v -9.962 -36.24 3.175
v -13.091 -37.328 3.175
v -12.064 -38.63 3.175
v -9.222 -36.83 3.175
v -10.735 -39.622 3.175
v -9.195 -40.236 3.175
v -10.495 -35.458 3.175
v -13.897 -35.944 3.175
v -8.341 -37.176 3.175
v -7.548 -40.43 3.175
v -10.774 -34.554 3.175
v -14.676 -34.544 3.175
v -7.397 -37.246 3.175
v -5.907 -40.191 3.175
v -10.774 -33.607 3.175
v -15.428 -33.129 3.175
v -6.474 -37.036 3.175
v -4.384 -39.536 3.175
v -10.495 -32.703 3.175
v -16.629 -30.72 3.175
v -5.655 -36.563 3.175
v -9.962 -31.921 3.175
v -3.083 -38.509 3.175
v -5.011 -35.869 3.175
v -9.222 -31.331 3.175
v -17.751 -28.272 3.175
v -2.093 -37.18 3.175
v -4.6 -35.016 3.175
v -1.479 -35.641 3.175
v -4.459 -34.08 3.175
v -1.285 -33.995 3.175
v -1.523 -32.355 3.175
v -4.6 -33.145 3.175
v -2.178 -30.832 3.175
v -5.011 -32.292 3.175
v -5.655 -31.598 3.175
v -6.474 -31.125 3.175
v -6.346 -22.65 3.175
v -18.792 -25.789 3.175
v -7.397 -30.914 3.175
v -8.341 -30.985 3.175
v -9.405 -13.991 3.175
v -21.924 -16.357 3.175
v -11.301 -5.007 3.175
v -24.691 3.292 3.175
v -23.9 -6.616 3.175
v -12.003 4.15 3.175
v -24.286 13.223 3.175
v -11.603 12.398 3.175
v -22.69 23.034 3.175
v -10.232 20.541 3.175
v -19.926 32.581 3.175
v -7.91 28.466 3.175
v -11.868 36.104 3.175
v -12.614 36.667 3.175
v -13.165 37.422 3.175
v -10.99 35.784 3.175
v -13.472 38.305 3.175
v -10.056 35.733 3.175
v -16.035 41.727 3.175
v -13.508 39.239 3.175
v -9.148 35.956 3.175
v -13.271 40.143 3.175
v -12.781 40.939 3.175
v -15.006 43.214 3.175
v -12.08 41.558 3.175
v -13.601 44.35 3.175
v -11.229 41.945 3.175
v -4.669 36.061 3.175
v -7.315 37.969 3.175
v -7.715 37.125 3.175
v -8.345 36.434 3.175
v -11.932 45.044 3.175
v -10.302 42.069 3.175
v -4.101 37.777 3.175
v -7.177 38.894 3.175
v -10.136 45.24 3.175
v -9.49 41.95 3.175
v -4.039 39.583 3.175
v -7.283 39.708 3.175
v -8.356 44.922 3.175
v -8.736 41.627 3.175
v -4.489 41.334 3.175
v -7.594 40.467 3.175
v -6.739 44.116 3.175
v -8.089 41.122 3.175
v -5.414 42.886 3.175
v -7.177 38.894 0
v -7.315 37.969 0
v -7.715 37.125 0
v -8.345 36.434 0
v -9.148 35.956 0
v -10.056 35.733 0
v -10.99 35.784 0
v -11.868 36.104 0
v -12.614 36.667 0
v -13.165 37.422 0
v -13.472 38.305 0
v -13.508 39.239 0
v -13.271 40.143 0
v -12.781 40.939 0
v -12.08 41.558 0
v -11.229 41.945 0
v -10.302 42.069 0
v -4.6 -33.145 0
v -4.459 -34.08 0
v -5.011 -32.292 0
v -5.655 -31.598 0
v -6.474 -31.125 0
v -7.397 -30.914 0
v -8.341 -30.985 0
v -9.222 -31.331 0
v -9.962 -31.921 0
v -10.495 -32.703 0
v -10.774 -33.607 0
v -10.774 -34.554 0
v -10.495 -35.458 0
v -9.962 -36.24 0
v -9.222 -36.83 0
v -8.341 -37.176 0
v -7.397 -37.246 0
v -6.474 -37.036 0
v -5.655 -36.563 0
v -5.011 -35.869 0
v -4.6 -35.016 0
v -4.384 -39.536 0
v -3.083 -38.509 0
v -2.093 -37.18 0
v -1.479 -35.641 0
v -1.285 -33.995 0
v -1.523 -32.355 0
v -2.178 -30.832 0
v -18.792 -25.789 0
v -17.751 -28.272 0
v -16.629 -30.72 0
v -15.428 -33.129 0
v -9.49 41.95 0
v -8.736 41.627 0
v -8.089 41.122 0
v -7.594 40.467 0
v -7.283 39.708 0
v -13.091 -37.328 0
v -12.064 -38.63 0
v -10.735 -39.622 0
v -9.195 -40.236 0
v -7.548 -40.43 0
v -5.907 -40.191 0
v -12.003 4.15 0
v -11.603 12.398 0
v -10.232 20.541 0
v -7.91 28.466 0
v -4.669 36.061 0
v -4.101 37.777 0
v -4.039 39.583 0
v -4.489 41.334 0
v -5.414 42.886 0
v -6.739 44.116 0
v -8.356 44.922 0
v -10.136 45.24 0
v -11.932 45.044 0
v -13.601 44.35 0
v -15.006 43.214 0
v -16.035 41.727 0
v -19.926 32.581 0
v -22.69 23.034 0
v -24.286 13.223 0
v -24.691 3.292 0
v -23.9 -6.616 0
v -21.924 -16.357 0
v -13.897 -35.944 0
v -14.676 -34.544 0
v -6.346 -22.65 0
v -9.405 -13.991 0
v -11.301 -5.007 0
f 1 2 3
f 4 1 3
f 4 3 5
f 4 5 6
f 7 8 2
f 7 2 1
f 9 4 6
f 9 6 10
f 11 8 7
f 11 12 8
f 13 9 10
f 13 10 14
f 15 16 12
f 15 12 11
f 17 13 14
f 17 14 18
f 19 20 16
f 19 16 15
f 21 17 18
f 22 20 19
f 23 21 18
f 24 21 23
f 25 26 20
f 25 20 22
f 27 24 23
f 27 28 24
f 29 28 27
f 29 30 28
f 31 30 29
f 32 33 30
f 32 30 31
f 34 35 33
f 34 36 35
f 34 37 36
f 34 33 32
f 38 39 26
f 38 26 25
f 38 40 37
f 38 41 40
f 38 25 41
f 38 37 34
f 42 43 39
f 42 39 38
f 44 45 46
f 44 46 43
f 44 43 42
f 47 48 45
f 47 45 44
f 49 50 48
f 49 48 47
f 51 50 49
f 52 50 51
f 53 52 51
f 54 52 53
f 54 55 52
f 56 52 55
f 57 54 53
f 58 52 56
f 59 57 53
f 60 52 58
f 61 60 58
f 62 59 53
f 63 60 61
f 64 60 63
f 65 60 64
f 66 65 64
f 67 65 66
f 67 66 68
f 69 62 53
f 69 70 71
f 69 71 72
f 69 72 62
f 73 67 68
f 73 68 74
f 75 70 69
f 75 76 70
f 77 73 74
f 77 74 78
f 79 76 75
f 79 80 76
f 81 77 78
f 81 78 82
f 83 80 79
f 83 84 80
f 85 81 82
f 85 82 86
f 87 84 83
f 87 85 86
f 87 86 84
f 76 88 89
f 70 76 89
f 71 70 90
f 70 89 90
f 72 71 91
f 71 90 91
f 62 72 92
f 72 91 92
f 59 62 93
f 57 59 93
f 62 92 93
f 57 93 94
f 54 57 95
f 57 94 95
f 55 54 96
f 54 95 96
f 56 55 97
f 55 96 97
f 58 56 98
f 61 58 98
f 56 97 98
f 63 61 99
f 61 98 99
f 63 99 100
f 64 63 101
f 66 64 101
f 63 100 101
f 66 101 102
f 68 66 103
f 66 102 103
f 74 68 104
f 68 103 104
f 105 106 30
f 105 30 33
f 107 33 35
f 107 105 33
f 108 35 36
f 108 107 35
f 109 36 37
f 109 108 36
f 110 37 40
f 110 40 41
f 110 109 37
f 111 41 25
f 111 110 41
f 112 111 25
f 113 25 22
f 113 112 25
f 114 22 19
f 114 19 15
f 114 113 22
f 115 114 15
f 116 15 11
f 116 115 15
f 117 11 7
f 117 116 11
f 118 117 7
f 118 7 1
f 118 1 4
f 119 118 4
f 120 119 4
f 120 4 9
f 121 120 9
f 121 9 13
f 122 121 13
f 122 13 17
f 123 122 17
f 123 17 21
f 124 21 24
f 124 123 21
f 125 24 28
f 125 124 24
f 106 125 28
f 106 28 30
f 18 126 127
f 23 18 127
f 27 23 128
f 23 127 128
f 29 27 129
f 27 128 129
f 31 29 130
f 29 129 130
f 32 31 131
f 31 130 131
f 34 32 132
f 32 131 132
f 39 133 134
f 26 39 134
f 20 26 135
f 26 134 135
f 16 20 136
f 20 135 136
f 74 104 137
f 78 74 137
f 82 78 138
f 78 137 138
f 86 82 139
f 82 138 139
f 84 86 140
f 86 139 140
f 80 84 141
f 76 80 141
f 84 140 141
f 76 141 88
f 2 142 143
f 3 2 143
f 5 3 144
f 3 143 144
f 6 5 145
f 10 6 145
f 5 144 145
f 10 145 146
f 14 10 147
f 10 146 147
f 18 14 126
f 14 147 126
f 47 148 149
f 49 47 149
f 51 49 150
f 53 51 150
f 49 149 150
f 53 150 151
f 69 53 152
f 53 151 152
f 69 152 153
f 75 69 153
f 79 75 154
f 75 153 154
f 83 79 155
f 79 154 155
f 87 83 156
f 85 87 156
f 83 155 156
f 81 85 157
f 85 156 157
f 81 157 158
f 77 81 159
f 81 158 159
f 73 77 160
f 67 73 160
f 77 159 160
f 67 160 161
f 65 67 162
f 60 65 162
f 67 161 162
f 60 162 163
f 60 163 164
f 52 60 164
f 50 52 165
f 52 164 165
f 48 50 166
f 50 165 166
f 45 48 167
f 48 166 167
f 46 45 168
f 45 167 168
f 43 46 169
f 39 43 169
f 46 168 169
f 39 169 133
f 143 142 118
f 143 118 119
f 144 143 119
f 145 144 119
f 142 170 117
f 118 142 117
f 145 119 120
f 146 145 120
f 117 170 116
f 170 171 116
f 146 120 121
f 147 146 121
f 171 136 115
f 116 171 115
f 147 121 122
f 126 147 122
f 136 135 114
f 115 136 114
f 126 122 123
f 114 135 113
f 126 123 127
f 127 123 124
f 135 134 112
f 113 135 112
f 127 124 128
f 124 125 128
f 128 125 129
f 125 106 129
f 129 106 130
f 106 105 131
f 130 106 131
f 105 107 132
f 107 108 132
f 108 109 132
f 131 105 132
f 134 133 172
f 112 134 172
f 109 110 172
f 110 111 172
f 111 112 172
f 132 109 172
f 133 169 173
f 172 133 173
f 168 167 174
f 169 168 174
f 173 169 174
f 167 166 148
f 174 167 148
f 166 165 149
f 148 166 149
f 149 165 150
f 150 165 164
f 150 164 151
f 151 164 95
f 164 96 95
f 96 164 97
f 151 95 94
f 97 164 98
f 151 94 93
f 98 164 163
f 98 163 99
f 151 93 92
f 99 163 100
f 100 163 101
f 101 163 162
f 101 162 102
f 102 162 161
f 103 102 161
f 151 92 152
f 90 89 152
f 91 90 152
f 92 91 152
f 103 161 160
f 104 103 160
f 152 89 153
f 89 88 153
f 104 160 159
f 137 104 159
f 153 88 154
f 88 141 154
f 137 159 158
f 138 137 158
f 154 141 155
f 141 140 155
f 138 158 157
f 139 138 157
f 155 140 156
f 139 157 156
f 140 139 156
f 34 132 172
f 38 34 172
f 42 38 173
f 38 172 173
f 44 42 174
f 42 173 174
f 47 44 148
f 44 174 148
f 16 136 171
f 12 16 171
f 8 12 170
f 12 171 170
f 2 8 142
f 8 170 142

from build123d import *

# Parameters (mm, degrees)
F0_R     = 3.175
F1_DEPTH = 3.175


with BuildPart() as f1:
    # F0 (on Top) → F1 (new body)
    with BuildSketch(Plane.XY):
        with BuildLine():
            ThreePointArc((-4.6690304578, 36.0608687482), (-4.926356626, 42.1933740702), (-10.2528819721, 45.2432865312))
            ThreePointArc((-10.2528819721, 45.2432865312), (-13.6512609491, 44.3196488769), (-16.034861924, 41.7272498758))
            ThreePointArc((-16.034861924, 41.7272498758), (-24.6382163154, 8.2639214044), (-18.7919287035, -25.7894628669))
            Line((-18.7919287035, -25.7894628669), (-12.3928580021, 2.7761611158))
            ThreePointArc((-12.3928580021, 2.7761611158), (-12.2172281013, 3.4683335365), (-12.0029711474, 4.1495401716))
            ThreePointArc((-12.0029711474, 4.1495401716), (-10.2322760444, 20.5410111397), (-4.6690304578, 36.0608687482))
        make_face()
        with BuildLine():
            ThreePointArc((-7.1769461909, 38.894059312), (-12.6144546933, 36.6665763656), (-10.3024140815, 42.0686729216))
            ThreePointArc((-10.3024140815, 42.0686729216), (-8.0894376884, 41.1215422584), (-7.1769461909, 38.894059312))
        make_face(mode=Mode.SUBTRACT)
        with BuildLine():
            ThreePointArc((-18.7919287035, -25.7894628669), (-17.199620286, -29.5004662895), (-15.4277360093, -33.1291600779))
            ThreePointArc((-15.4277360093, -33.1291600779), (-10.0074027219, -36.507133329), (-4.3842812821, -39.5355357964))
            ThreePointArc((-4.3842812821, -39.5355357964), (-1.4791469298, -35.6407535094), (-2.1779859288, -30.8323485013))
            ThreePointArc((-2.1779859288, -30.8323485013), (-9.4049707621, -13.9914505961), (-12.0029711474, 4.1495401716))
            ThreePointArc((-12.0029711474, 4.1495401716), (-12.2172281013, 3.4683335365), (-12.3928580021, 2.7761611158))
            Line((-12.3928580021, 2.7761611158), (-18.7919287035, -25.7894628669))
        make_face()
        with Locations((-7.6344430684, -34.0803595057)):
            Circle(F0_R, mode=Mode.SUBTRACT)
        with BuildLine():
            ThreePointArc((-4.3842812821, -39.5355357964), (-10.0074027219, -36.507133329), (-15.4277360093, -33.1291600779))
            ThreePointArc((-15.4277360093, -33.1291600779), (-14.2898816566, -35.2457737279), (-13.0909002079, -37.32837051))
            ThreePointArc((-13.0909002079, -37.32837051), (-9.1948370721, -40.2356556442), (-4.3842812821, -39.5355357964))
        make_face()
    extrude(amount=F1_DEPTH)


solid = f1.part
